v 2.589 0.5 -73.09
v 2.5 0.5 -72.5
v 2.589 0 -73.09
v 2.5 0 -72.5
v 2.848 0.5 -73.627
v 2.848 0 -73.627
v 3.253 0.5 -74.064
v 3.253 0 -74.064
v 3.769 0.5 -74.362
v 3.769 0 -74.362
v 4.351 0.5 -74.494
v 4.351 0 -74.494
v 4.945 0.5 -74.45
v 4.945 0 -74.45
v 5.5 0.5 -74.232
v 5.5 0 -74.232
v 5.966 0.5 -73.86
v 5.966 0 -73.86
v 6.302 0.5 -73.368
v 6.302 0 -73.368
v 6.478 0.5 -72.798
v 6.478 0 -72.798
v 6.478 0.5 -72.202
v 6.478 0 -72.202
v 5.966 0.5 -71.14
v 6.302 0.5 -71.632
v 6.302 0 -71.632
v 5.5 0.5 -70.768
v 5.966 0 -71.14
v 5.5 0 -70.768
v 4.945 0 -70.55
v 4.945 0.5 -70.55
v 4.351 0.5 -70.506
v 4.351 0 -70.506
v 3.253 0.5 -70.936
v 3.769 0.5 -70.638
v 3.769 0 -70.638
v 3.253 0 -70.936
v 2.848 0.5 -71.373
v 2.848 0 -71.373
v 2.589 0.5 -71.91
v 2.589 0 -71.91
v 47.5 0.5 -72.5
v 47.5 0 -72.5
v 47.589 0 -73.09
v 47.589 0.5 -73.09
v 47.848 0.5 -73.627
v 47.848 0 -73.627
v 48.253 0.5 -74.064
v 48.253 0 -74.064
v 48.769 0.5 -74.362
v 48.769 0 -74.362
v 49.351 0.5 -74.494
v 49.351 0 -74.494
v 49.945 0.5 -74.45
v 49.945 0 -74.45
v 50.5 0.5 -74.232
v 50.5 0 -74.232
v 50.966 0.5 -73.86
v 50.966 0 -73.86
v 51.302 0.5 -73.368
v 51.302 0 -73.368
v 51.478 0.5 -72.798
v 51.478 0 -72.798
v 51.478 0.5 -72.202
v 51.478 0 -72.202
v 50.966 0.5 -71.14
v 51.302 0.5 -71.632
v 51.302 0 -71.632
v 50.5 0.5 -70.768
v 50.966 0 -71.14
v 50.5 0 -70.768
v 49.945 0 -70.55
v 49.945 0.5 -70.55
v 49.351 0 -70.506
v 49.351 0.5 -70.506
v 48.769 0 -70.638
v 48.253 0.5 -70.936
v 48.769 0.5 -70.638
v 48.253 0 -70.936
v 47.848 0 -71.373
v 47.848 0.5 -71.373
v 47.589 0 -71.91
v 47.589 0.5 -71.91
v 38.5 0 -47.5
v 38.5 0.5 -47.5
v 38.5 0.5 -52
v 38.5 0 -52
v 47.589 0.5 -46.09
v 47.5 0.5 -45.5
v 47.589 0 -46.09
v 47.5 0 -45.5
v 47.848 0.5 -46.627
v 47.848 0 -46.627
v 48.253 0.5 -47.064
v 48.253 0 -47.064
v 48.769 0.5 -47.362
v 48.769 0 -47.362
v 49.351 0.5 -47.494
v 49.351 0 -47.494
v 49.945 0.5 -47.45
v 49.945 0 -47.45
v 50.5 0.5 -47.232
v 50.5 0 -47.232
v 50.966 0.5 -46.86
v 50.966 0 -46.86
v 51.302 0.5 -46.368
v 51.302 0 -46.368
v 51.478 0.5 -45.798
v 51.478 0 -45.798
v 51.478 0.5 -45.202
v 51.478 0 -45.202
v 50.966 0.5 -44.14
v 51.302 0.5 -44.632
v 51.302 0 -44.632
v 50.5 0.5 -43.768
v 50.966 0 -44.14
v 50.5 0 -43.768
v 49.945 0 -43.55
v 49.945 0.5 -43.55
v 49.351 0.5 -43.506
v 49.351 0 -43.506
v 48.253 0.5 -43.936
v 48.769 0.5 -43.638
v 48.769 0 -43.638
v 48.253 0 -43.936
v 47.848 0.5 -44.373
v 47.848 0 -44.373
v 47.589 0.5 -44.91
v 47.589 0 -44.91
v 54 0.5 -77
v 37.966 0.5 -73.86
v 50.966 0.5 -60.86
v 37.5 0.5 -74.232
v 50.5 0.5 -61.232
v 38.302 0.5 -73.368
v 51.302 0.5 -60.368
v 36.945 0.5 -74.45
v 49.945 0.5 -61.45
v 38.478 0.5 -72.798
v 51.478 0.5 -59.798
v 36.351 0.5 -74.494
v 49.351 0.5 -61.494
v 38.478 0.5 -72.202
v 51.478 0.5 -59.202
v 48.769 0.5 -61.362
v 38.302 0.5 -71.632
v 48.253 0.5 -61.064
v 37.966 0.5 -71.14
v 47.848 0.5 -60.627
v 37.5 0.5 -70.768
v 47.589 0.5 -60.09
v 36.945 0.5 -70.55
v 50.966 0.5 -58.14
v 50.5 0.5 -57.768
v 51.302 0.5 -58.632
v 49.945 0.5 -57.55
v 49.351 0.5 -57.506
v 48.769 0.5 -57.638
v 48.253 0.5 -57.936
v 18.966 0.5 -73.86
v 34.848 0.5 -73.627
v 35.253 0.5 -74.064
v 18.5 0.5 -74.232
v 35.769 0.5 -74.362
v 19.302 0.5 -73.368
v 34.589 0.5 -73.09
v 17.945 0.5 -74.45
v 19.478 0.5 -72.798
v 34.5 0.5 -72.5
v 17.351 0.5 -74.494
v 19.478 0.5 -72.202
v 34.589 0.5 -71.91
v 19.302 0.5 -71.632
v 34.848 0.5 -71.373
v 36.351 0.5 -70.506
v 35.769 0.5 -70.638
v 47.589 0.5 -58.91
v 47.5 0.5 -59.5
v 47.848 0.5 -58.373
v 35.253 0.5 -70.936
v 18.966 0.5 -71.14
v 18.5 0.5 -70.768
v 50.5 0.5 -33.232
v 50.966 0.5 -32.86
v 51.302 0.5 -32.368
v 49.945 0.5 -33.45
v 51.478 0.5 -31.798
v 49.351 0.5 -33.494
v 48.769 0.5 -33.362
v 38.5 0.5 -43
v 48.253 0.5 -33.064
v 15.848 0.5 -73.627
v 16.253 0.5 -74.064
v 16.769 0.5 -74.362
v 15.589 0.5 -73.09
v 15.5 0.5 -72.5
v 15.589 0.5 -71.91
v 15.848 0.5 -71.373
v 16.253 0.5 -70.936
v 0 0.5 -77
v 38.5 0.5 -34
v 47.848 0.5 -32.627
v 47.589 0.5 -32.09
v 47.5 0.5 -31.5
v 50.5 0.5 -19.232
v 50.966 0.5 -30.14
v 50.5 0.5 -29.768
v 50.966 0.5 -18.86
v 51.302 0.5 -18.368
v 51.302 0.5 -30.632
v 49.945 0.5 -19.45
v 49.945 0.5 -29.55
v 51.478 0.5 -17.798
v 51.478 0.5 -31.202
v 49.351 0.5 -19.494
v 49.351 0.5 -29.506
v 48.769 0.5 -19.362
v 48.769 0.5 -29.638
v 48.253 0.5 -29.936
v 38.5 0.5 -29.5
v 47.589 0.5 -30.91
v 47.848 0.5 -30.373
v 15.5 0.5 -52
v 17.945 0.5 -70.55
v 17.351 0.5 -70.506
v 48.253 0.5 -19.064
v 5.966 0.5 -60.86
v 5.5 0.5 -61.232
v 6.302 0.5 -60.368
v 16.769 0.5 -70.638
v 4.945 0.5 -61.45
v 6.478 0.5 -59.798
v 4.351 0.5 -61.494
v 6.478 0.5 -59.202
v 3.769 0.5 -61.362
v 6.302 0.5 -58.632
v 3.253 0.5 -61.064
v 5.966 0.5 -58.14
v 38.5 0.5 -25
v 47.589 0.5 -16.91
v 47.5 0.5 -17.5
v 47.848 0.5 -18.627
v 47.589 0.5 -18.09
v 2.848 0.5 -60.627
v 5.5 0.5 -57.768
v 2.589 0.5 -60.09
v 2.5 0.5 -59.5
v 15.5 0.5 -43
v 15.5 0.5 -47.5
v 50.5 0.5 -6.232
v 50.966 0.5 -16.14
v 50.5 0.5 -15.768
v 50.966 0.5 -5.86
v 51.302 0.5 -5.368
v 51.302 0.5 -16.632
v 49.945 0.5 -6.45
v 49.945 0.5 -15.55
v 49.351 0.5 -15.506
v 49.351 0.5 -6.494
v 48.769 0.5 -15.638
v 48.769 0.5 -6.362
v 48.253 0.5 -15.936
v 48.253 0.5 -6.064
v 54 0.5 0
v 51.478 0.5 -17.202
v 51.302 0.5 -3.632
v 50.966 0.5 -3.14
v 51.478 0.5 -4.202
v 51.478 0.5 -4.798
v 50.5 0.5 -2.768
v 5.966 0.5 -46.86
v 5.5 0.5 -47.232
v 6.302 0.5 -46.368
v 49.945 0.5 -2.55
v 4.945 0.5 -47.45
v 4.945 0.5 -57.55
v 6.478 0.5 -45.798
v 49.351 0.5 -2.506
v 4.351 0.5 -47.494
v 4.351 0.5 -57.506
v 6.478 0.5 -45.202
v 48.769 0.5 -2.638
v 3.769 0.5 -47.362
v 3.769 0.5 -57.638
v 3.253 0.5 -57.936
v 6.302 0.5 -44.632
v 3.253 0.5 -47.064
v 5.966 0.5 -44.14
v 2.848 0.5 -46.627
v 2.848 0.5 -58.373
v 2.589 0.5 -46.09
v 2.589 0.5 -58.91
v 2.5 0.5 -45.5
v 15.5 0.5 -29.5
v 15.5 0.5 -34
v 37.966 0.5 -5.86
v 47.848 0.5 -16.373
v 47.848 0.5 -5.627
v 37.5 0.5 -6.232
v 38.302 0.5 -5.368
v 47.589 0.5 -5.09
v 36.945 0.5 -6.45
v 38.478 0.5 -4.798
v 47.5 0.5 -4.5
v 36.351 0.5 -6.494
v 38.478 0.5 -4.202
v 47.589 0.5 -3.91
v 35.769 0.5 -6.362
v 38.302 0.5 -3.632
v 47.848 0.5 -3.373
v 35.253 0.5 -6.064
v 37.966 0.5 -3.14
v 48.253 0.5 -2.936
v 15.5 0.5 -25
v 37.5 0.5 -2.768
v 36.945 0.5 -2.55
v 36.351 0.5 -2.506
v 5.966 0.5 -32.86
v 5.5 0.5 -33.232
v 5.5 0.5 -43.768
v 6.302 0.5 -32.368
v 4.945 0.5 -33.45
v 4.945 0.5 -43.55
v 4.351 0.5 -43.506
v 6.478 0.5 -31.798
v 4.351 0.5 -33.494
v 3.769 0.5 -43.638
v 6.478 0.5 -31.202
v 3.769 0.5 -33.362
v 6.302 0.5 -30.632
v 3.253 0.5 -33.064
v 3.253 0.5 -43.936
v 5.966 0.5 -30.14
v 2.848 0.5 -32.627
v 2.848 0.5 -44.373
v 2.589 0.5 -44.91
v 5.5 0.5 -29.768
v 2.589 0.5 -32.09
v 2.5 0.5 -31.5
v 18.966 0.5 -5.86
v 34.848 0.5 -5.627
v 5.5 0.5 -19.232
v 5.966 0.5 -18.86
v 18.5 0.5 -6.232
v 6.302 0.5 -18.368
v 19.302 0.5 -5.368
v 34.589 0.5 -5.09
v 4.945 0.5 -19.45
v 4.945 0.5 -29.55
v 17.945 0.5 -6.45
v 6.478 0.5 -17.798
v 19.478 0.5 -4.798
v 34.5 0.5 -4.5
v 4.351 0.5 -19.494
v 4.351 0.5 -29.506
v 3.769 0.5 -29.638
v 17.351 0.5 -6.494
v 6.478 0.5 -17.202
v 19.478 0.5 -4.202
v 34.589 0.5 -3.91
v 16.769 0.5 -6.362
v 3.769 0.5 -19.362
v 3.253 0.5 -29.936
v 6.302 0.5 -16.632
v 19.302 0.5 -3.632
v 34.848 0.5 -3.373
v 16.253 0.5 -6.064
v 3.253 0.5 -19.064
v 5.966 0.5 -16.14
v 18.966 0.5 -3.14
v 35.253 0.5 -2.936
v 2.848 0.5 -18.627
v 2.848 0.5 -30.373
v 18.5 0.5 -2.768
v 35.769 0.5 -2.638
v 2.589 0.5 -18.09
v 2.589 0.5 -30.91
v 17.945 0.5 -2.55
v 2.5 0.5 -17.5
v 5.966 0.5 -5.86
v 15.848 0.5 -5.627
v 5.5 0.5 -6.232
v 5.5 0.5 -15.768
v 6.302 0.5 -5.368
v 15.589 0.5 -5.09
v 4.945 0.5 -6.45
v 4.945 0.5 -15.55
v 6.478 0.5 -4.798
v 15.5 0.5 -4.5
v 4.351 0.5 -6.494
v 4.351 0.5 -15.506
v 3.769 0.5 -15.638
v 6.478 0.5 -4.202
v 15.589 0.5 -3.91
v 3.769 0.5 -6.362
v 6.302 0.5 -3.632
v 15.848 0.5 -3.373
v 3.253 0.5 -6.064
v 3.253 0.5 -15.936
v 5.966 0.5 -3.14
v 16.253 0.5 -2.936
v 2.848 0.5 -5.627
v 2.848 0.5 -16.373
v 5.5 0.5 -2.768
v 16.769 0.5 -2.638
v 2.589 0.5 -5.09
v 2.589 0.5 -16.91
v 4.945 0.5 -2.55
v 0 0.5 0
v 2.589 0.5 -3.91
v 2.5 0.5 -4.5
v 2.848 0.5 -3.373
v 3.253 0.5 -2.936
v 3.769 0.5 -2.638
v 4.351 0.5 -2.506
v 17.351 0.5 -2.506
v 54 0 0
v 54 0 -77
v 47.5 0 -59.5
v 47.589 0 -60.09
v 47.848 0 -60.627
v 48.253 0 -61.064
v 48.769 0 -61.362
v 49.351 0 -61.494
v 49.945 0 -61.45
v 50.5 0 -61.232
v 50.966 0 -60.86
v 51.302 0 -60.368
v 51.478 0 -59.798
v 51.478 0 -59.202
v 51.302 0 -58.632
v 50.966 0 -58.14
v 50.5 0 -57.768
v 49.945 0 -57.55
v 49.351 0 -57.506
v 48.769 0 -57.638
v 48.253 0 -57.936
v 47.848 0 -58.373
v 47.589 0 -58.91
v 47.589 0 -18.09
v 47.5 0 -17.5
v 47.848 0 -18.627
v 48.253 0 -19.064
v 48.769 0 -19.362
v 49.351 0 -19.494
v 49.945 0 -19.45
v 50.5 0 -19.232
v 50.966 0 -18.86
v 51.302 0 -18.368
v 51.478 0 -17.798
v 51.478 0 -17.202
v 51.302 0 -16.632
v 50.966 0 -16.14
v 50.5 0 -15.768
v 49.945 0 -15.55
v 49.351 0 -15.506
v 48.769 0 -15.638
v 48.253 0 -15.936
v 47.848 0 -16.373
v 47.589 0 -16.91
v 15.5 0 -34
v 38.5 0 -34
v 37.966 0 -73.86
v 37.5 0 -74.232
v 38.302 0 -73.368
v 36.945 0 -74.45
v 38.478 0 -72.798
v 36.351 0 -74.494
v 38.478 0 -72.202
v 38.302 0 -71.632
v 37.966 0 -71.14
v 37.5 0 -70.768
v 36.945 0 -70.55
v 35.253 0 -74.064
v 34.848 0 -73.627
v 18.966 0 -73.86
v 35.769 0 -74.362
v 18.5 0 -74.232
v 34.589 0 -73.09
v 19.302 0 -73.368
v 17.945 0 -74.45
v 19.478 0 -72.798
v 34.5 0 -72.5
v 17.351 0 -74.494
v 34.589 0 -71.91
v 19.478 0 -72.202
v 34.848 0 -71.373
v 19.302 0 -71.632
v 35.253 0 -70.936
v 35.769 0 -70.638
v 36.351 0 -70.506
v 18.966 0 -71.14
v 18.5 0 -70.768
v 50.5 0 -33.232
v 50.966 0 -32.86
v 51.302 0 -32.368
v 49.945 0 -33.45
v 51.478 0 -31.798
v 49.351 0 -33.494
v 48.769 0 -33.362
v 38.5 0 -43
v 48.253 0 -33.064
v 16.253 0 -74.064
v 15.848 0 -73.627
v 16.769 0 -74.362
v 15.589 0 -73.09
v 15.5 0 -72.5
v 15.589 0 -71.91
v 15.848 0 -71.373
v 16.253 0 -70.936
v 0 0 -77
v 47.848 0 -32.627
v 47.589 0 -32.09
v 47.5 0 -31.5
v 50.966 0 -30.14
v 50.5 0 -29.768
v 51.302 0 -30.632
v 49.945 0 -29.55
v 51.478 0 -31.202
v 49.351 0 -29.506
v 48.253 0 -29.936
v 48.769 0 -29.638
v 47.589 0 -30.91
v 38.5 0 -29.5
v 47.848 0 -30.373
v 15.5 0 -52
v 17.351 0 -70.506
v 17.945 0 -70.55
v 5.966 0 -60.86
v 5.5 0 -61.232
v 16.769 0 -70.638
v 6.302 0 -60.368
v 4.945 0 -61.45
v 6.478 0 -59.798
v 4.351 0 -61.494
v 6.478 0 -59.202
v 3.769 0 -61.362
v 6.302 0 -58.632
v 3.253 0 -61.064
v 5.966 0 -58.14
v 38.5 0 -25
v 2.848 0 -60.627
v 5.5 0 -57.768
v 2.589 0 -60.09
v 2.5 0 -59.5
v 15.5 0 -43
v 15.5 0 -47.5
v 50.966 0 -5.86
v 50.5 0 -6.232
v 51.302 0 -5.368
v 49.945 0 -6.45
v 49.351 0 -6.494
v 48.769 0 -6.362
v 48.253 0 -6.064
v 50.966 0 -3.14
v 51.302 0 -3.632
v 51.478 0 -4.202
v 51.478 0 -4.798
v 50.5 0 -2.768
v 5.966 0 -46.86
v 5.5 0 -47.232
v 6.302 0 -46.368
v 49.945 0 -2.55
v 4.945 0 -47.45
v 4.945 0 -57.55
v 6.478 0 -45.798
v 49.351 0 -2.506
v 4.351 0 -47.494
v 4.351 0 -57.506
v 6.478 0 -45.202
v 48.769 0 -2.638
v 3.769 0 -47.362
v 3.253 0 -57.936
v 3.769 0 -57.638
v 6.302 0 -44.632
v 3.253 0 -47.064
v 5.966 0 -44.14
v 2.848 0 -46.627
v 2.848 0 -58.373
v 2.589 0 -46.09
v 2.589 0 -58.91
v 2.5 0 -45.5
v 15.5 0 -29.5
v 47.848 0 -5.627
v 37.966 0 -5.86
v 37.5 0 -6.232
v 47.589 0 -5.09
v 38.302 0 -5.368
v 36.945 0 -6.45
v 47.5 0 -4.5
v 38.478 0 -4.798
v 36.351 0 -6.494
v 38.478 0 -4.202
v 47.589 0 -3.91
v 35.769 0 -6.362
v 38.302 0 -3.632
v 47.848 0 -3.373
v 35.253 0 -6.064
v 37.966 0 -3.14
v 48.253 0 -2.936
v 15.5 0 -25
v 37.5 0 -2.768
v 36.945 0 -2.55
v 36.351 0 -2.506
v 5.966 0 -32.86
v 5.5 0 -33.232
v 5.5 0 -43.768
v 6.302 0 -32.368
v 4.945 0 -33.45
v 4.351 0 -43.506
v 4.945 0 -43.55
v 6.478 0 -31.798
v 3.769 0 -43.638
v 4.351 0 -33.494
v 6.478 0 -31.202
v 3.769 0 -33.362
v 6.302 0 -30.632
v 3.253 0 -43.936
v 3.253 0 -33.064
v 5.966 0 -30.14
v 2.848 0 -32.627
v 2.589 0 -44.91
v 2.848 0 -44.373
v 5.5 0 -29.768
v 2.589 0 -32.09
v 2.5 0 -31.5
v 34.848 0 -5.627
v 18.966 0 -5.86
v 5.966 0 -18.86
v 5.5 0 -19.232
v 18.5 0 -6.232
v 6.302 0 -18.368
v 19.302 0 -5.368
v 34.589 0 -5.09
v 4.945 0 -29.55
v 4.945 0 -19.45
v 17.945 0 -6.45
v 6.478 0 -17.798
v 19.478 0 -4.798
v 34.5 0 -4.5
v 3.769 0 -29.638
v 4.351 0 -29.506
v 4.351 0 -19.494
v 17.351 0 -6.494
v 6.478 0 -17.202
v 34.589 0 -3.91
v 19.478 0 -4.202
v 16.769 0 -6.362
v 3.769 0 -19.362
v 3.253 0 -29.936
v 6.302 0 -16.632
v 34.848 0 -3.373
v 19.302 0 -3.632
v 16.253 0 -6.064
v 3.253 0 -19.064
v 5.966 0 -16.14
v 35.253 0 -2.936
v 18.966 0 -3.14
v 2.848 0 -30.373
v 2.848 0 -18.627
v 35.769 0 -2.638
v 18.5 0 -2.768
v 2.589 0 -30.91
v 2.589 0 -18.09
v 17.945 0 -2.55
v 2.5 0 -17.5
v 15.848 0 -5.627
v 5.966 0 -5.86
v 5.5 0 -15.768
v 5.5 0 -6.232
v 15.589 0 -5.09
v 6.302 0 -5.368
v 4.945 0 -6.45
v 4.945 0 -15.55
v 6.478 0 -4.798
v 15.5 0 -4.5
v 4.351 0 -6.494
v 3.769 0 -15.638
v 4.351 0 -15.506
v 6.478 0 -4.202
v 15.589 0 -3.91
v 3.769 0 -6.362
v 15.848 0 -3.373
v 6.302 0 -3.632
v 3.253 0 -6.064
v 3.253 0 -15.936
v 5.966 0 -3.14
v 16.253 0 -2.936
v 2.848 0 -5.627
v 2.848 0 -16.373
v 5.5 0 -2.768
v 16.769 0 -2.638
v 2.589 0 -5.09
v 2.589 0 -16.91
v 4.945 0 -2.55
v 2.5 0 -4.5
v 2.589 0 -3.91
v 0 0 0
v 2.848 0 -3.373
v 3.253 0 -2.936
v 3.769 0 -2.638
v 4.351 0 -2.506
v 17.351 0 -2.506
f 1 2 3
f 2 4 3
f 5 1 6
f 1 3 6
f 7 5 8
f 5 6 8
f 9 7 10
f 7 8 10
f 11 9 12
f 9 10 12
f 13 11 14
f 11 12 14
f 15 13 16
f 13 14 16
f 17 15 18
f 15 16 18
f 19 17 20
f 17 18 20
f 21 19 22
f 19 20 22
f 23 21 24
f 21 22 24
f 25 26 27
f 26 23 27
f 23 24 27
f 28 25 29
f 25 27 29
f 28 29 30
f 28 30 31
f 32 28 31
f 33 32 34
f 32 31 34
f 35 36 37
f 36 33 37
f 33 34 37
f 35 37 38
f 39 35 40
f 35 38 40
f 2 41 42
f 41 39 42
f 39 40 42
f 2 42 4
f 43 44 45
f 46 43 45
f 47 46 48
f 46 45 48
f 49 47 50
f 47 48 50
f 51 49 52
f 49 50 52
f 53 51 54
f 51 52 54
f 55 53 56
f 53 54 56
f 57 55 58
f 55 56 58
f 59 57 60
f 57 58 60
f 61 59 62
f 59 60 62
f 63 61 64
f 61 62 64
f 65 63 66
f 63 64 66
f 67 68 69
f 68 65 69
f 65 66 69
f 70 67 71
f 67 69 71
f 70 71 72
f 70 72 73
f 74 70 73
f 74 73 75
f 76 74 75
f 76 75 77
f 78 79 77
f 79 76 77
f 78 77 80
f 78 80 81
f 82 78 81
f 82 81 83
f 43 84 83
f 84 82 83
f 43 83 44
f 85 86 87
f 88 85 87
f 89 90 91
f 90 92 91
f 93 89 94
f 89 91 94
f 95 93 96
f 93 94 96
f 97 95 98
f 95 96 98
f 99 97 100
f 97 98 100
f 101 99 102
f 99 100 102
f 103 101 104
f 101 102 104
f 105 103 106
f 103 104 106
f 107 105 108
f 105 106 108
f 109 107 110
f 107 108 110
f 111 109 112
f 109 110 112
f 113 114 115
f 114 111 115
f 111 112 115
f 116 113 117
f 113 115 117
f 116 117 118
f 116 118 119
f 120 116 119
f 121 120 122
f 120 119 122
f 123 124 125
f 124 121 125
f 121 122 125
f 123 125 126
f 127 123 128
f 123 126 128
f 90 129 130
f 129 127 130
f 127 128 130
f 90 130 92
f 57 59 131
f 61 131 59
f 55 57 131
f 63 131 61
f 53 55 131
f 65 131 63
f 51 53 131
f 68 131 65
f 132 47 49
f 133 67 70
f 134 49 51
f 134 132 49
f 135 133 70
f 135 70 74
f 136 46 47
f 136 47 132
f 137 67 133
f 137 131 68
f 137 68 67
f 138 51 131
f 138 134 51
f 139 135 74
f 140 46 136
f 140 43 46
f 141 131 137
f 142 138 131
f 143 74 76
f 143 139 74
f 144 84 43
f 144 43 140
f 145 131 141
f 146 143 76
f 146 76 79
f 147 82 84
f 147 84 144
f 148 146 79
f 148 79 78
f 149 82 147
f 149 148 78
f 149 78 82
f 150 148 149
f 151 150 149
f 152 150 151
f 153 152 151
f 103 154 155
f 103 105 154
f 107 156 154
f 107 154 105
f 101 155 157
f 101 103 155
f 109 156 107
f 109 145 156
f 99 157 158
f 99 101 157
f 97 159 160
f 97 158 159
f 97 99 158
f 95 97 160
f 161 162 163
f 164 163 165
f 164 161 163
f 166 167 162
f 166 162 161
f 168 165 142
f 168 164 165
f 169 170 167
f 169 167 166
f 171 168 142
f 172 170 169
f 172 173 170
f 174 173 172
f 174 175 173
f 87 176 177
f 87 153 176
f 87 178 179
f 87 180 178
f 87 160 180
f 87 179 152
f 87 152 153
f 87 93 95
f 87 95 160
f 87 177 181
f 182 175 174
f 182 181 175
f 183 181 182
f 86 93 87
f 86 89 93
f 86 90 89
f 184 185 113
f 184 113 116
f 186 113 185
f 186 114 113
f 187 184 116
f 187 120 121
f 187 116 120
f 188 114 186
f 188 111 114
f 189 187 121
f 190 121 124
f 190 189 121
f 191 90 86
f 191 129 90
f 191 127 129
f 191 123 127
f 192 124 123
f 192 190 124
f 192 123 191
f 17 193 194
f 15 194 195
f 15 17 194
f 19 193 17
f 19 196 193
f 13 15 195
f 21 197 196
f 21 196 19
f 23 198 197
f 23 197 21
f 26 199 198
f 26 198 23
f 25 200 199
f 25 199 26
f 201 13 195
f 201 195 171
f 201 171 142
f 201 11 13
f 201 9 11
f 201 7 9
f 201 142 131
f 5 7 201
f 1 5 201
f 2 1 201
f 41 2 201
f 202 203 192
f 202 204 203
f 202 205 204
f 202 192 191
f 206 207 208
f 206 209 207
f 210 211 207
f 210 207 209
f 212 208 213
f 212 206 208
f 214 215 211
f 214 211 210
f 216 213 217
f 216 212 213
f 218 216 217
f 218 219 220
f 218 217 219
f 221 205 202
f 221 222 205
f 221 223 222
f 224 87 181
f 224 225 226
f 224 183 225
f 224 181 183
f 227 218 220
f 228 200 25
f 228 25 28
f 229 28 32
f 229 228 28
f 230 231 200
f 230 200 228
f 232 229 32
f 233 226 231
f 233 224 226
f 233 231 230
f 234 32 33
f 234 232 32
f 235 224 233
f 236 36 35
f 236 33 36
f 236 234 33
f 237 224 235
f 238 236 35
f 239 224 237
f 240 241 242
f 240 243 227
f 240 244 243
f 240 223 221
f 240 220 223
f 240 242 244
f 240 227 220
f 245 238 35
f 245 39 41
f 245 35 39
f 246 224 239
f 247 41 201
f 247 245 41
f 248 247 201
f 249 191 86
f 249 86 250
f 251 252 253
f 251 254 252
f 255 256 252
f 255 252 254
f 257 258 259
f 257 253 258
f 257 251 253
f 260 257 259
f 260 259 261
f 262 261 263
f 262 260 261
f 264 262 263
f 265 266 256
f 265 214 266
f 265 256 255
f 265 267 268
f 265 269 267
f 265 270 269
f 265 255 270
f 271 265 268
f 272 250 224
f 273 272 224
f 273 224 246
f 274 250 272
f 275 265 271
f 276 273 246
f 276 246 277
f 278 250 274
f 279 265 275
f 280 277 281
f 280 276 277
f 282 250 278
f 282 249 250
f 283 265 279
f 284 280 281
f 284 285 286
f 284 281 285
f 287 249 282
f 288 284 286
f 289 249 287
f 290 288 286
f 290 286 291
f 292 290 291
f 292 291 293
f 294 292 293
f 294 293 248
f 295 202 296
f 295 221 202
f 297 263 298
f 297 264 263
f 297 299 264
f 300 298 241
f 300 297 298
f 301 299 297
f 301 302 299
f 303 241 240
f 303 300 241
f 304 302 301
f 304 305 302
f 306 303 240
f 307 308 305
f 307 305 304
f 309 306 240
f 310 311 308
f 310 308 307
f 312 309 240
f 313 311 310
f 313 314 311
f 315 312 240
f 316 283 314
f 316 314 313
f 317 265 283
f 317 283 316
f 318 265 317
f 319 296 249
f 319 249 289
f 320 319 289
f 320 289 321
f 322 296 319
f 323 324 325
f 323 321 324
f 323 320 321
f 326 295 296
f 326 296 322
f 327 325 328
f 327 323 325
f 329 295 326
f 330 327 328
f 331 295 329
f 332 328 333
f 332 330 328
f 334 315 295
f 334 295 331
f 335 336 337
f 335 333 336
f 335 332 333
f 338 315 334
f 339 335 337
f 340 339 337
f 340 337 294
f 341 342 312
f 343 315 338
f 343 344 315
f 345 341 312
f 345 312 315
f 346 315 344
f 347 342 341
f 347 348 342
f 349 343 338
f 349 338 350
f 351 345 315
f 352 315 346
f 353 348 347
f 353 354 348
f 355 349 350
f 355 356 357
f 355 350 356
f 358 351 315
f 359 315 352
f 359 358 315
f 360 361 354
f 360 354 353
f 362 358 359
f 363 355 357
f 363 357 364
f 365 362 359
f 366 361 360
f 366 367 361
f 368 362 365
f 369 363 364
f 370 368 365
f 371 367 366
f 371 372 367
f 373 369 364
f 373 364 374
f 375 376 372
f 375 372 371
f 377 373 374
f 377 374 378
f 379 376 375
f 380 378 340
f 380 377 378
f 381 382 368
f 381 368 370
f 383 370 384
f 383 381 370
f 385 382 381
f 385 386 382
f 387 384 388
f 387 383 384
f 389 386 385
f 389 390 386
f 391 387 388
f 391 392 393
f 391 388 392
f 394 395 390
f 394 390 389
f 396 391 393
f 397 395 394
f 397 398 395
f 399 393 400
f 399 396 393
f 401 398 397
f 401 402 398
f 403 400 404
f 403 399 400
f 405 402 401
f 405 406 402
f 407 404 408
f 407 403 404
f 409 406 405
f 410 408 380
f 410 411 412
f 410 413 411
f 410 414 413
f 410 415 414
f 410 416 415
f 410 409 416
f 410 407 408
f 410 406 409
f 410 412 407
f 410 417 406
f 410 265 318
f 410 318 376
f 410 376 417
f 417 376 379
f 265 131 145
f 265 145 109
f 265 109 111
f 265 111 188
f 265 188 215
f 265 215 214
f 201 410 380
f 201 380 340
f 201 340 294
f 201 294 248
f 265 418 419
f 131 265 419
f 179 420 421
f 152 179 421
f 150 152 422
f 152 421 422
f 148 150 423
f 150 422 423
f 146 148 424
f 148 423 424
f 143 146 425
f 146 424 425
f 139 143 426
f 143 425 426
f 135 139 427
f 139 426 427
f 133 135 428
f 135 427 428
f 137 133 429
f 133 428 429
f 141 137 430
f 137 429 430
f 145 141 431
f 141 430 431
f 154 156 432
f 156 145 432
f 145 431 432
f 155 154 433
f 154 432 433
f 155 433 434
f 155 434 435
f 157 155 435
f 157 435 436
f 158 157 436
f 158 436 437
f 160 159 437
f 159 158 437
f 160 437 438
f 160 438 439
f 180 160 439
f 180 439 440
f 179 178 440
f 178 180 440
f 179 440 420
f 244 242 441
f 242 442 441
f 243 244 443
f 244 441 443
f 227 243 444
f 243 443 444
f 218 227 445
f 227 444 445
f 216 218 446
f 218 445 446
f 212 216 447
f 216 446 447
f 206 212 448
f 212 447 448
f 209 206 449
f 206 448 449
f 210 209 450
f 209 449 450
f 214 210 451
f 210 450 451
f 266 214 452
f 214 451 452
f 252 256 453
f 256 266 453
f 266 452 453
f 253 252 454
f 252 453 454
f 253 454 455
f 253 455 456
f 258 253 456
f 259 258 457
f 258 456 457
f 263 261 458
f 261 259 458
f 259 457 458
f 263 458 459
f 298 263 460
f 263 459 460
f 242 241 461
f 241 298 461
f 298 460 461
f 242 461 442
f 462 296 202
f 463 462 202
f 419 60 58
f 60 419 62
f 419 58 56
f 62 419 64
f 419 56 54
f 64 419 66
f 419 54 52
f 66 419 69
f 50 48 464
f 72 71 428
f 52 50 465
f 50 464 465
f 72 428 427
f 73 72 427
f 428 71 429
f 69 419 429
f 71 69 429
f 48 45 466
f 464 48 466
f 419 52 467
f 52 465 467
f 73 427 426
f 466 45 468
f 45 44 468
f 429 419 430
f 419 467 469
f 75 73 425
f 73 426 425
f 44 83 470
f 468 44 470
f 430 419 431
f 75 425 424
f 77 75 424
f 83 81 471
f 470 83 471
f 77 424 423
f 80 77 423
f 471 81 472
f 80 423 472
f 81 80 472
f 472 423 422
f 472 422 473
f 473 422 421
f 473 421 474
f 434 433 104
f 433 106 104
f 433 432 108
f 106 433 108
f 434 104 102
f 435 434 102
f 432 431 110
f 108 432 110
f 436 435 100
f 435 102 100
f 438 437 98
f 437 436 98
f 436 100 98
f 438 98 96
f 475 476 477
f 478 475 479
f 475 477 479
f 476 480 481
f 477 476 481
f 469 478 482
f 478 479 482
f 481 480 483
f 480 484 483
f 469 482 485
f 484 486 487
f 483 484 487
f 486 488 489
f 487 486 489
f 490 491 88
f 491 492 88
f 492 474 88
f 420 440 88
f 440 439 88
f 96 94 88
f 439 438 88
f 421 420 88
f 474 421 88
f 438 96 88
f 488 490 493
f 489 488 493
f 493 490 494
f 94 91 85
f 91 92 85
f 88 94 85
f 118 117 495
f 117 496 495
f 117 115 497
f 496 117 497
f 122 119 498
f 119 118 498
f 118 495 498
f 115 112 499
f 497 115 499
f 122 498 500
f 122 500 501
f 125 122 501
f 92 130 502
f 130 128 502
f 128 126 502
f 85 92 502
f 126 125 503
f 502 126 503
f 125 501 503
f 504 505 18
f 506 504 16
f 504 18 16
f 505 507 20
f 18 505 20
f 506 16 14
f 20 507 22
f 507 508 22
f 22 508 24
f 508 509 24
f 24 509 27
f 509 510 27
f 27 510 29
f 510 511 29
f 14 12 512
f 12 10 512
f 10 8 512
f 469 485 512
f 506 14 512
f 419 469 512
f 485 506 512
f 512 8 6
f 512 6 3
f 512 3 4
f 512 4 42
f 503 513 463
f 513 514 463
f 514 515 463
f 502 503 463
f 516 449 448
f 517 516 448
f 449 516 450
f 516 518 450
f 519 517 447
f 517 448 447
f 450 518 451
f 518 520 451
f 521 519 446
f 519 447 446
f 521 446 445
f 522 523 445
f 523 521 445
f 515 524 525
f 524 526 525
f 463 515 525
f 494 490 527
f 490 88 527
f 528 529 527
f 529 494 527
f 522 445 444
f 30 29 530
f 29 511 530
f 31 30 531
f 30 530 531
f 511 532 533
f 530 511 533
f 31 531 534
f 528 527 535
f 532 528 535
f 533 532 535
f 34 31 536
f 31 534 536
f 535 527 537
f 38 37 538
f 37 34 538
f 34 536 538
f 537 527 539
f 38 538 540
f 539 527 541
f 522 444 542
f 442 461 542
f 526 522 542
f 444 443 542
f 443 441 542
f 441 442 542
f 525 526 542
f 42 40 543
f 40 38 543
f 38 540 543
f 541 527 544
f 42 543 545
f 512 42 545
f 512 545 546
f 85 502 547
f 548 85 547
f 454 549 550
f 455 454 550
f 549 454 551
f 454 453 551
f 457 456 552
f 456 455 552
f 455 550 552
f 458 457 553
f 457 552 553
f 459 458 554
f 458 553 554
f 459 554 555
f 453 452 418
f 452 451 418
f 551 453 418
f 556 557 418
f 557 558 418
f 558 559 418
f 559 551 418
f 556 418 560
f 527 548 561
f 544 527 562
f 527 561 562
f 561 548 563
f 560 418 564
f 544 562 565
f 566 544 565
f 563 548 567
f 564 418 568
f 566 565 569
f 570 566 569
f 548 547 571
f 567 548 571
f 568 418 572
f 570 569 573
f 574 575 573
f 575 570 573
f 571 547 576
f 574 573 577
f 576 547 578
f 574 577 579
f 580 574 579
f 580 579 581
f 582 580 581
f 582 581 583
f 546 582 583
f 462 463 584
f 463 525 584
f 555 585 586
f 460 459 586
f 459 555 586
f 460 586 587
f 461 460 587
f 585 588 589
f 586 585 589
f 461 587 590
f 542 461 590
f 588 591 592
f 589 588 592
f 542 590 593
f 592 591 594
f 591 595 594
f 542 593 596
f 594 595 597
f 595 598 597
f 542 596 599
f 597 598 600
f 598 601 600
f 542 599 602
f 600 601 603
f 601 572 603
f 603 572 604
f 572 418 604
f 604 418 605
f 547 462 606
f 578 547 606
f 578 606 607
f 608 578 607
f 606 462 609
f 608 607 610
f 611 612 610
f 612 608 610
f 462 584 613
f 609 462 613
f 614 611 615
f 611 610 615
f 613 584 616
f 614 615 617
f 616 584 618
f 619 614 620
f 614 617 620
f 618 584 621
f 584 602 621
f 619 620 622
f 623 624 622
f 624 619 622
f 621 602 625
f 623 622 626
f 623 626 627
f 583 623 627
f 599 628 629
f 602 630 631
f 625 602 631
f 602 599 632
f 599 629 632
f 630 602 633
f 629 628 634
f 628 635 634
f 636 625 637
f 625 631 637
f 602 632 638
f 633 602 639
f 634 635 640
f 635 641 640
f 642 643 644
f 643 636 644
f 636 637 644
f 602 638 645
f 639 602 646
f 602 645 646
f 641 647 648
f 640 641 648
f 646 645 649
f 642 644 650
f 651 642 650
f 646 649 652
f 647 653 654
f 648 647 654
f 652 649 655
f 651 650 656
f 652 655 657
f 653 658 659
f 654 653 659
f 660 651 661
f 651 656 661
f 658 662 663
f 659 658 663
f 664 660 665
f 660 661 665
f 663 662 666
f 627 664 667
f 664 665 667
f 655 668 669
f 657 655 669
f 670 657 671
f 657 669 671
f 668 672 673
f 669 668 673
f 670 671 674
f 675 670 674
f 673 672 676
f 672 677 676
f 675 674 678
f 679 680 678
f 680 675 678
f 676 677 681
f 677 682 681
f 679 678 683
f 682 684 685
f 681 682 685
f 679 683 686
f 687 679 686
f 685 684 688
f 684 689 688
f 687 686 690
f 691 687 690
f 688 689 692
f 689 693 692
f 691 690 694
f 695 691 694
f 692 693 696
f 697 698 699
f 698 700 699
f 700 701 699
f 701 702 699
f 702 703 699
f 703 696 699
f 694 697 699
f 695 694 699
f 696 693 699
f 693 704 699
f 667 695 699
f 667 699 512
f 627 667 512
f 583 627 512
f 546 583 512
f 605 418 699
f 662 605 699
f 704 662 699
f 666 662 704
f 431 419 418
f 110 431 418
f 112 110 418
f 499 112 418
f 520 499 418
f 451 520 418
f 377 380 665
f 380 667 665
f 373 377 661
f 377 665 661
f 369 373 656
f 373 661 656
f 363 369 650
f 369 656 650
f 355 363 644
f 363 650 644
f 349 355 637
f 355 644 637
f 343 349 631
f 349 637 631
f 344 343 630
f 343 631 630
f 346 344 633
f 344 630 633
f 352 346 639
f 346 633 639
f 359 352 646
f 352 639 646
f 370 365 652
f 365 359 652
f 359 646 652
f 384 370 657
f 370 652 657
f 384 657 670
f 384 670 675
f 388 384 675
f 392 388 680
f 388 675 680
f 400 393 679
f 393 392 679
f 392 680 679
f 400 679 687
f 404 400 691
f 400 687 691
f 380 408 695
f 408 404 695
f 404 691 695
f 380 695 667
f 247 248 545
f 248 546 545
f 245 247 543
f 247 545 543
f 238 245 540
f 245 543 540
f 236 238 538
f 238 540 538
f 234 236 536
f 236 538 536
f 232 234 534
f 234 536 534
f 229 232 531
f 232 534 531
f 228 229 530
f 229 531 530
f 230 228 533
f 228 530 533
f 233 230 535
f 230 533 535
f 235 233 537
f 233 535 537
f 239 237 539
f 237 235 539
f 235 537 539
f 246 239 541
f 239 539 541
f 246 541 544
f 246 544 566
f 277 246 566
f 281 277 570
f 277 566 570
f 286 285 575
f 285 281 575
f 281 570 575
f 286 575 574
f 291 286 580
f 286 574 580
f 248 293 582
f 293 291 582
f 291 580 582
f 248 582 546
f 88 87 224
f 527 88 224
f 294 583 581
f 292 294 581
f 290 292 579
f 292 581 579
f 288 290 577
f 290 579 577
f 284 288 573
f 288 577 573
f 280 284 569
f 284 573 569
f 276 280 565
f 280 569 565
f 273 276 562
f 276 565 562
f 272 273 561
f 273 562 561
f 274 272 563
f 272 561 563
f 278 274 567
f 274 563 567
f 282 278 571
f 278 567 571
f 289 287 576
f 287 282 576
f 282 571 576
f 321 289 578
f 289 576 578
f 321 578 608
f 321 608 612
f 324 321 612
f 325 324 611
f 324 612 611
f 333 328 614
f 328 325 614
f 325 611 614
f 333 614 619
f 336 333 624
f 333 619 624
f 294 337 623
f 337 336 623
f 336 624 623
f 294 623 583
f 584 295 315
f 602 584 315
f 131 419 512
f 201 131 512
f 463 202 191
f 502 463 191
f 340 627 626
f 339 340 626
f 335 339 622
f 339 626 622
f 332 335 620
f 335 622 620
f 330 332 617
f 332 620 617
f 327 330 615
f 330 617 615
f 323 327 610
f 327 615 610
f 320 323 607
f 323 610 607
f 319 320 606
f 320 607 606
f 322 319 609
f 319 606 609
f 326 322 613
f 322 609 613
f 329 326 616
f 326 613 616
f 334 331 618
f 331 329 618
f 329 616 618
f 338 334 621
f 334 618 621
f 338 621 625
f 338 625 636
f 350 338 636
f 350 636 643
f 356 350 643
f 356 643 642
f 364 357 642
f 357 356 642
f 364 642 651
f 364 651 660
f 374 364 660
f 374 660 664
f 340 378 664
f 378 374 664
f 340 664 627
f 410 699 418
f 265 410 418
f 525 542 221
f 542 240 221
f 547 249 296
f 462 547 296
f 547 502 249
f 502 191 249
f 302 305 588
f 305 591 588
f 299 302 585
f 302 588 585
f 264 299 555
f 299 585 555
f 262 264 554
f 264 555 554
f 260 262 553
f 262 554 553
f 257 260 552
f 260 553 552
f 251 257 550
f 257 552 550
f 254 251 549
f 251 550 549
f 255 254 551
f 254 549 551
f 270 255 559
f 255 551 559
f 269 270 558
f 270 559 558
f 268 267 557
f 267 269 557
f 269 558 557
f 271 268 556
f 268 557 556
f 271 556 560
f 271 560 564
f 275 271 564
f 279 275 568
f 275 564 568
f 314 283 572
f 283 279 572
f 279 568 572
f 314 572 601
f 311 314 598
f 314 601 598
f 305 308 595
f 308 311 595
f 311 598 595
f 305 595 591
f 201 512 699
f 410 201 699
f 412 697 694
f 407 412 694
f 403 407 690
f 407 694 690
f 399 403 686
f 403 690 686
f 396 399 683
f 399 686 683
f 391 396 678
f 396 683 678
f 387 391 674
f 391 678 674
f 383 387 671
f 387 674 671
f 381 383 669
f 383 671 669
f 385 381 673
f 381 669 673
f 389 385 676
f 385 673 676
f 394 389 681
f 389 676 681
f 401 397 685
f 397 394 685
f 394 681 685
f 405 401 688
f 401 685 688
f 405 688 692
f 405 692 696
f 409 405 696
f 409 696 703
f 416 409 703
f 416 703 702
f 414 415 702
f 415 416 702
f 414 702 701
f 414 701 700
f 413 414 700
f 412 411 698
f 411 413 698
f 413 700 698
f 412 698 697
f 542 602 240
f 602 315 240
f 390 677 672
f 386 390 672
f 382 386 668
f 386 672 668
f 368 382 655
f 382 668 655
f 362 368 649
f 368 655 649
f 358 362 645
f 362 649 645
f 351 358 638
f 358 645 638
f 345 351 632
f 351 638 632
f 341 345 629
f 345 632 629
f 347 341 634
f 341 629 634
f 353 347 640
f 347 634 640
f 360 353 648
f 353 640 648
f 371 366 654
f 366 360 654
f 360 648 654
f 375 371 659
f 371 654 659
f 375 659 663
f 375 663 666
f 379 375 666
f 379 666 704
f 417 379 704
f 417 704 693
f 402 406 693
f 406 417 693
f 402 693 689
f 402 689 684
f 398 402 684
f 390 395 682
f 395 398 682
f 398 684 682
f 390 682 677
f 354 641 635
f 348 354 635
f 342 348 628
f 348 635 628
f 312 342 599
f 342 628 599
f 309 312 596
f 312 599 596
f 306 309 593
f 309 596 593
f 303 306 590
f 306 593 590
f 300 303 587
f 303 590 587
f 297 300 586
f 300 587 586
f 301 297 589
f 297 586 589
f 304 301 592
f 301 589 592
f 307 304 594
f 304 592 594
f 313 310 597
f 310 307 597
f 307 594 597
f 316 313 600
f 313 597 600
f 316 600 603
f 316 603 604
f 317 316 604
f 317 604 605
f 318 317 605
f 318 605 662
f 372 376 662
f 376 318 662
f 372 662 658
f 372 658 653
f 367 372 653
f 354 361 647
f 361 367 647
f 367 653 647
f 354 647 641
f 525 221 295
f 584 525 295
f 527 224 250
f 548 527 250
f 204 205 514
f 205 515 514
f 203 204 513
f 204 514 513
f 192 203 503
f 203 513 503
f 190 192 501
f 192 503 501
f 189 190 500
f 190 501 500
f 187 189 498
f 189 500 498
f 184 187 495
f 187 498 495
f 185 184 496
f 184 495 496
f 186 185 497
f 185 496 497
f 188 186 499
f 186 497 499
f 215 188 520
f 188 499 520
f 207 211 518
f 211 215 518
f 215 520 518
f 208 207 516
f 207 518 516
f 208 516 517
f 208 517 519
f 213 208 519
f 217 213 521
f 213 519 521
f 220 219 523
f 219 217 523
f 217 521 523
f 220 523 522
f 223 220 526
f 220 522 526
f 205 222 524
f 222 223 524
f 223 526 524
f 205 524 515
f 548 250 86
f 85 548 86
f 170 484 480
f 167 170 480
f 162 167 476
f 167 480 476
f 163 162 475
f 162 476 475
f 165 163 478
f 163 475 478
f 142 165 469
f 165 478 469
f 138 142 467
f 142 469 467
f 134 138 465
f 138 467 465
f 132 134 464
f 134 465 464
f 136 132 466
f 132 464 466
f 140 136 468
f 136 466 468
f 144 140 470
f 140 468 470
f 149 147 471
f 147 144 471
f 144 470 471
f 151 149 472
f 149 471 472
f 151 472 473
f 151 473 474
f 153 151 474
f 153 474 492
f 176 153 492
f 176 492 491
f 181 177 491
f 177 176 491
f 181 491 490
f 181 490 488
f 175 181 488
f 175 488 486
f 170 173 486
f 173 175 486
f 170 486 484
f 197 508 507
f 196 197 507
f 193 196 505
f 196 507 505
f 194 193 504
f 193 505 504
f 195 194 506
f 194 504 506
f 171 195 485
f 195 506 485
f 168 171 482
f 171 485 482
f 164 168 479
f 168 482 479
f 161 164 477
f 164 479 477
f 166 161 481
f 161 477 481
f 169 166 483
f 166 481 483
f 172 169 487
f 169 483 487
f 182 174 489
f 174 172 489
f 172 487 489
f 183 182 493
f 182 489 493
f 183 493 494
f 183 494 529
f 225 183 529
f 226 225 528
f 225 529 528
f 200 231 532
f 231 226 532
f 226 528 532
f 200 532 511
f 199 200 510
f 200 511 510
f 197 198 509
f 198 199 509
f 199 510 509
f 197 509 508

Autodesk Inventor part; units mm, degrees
ref_plane "YZ Plane" through (0, 0, 0) normal (1, 0, 0) x (0, 1, 0)
ref_plane "XZ Plane" through (0, 0, 0) normal (0, 1, 0) x (-1, 0, 0)
ref_plane "XY Plane" through (0, 0, 0) normal (0, 0, 1) x (1, 0, 0)
sketch "Sketch1" plane through (0, 0, 0) normal (0, 1, 0) x (-1, 0, 0)
  line L0 (0, 0) -> (-54, 0)
  line L1 (-54, 0) -> (-54, -77)
  line L2 (-54, -77) -> (0, -77)
  line L3 (0, -77) -> (0, 0)
  line L4 (-4.5, -4.5) -> (-49.5, -4.5) construction
  line L5 (-49.5, -4.5) -> (-49.5, -72.5) construction
  line L6 (-49.5, -72.5) -> (-4.5, -72.5) construction
  line L7 (-4.5, -72.5) -> (-4.5, -4.5) construction
  circle A0 centre (-4.5, -4.5) radius 2
  circle A1 centre (-17.5, -4.5) radius 2
  circle A2 centre (-49.5, -4.5) radius 2
  circle A3 centre (-49.5, -17.5) radius 2
  circle A4 centre (-49.5, -31.5) radius 2
  circle A5 centre (-49.5, -45.5) radius 2
  circle A6 centre (-49.5, -59.5) radius 2
  circle A7 centre (-49.5, -72.5) radius 2
  circle A8 centre (-36.5, -72.5) radius 2
  circle A9 centre (-17.5, -72.5) radius 2
  circle A10 centre (-4.5, -72.5) radius 2
  circle A11 centre (-4.5, -59.5) radius 2
  circle A12 centre (-4.5, -45.5) radius 2
  circle A13 centre (-4.5, -31.5) radius 2
  circle A14 centre (-4.5, -17.5) radius 2
  circle A15 centre (-36.5, -4.5) radius 2
  dimension "d0" = 54
  dimension "d1" = 77
  dimension "d2" = 4
  dimension "d3" = 4
  dimension "d5" = 4
  dimension "d6" = 4
  dimension "d7" = 4
  dimension "d8" = 4
  dimension "d9" = 4
  dimension "d10" = 4
  dimension "d11" = 4
  dimension "d12" = 4
  dimension "d13" = 4
  dimension "d14" = 4
  dimension "d15" = 4
  dimension "d16" = 4
  dimension "d17" = 4
  dimension "d18" = 4.5
  dimension "d20" = 4.5
  dimension "d21" = 4.5
  dimension "d22" = 4.5
  dimension "d23" = 13
  dimension "d27" = 14
  dimension "d28" = 14
  dimension "d29" = 14
  dimension "d30" = 4.5
  dimension "d31" = 4
  dimension "d32" = 13
  dimension "d33" = 19
  dimension "d34" = 13
  dimension "d35" = 14
  dimension "d36" = 14
  dimension "d37" = 14
  dimension "d38" = 13
  dimension "d39" = 19
extrude "Extrusion1" add sketch "Sketch1" along normal blind 0.5
sketch "Sketch2" plane through (0, 0.5, 0) normal (0, 1, 0) x (1, 0, 0)
  line L0 (15.5, 47.5) -> (38.5, 47.5)
  line L1 (38.5, 47.5) -> (38.5, 52)
  line L2 (38.5, 52) -> (15.5, 52)
  line L3 (15.5, 52) -> (15.5, 47.5)
  line L4 (27, 0) -> (27, 77) construction
  line L5 (54, 0) -> (54, 77) projected
  line L6 (0, 38.5) -> (54, 38.5) construction
  line L7 (54, 77) -> (0, 77) projected
  line L8 (15.5, 34) -> (38.5, 34)
  line L9 (38.5, 34) -> (38.5, 43)
  line L10 (38.5, 43) -> (15.5, 43)
  line L11 (15.5, 43) -> (15.5, 34)
  line L12 (15.5, 25) -> (38.5, 25)
  line L13 (38.5, 25) -> (38.5, 29.5)
  line L14 (38.5, 29.5) -> (15.5, 29.5)
  line L15 (15.5, 29.5) -> (15.5, 25)
  circle A0 centre (4.5, 45.5) radius 2 projected
  circle A1 centre (4.5, 31.5) radius 2 projected
  point P0 (0, 0)
  point P1 (15.5, 38.5)
  point P2 (27, 43)
  point P3 (27, 47.5)
  point P4 (27, 29.5)
  dimension "d42" = 27
  dimension "d43" = 38.5
  dimension "d47" = 9
  dimension "d48" = 23
  dimension "d49" = 4.5
  dimension "d50" = 4.5
  dimension "d51" = 23
  dimension "d52" = 4.5
  dimension "d53" = 4.5
extrude "Extrusion2" cut sketch "Sketch2" against normal through all contours L3 L2 L1 L0 | L11 L10 L9 L8 | L15 L14 L13 L12
properties part number "1-33"
